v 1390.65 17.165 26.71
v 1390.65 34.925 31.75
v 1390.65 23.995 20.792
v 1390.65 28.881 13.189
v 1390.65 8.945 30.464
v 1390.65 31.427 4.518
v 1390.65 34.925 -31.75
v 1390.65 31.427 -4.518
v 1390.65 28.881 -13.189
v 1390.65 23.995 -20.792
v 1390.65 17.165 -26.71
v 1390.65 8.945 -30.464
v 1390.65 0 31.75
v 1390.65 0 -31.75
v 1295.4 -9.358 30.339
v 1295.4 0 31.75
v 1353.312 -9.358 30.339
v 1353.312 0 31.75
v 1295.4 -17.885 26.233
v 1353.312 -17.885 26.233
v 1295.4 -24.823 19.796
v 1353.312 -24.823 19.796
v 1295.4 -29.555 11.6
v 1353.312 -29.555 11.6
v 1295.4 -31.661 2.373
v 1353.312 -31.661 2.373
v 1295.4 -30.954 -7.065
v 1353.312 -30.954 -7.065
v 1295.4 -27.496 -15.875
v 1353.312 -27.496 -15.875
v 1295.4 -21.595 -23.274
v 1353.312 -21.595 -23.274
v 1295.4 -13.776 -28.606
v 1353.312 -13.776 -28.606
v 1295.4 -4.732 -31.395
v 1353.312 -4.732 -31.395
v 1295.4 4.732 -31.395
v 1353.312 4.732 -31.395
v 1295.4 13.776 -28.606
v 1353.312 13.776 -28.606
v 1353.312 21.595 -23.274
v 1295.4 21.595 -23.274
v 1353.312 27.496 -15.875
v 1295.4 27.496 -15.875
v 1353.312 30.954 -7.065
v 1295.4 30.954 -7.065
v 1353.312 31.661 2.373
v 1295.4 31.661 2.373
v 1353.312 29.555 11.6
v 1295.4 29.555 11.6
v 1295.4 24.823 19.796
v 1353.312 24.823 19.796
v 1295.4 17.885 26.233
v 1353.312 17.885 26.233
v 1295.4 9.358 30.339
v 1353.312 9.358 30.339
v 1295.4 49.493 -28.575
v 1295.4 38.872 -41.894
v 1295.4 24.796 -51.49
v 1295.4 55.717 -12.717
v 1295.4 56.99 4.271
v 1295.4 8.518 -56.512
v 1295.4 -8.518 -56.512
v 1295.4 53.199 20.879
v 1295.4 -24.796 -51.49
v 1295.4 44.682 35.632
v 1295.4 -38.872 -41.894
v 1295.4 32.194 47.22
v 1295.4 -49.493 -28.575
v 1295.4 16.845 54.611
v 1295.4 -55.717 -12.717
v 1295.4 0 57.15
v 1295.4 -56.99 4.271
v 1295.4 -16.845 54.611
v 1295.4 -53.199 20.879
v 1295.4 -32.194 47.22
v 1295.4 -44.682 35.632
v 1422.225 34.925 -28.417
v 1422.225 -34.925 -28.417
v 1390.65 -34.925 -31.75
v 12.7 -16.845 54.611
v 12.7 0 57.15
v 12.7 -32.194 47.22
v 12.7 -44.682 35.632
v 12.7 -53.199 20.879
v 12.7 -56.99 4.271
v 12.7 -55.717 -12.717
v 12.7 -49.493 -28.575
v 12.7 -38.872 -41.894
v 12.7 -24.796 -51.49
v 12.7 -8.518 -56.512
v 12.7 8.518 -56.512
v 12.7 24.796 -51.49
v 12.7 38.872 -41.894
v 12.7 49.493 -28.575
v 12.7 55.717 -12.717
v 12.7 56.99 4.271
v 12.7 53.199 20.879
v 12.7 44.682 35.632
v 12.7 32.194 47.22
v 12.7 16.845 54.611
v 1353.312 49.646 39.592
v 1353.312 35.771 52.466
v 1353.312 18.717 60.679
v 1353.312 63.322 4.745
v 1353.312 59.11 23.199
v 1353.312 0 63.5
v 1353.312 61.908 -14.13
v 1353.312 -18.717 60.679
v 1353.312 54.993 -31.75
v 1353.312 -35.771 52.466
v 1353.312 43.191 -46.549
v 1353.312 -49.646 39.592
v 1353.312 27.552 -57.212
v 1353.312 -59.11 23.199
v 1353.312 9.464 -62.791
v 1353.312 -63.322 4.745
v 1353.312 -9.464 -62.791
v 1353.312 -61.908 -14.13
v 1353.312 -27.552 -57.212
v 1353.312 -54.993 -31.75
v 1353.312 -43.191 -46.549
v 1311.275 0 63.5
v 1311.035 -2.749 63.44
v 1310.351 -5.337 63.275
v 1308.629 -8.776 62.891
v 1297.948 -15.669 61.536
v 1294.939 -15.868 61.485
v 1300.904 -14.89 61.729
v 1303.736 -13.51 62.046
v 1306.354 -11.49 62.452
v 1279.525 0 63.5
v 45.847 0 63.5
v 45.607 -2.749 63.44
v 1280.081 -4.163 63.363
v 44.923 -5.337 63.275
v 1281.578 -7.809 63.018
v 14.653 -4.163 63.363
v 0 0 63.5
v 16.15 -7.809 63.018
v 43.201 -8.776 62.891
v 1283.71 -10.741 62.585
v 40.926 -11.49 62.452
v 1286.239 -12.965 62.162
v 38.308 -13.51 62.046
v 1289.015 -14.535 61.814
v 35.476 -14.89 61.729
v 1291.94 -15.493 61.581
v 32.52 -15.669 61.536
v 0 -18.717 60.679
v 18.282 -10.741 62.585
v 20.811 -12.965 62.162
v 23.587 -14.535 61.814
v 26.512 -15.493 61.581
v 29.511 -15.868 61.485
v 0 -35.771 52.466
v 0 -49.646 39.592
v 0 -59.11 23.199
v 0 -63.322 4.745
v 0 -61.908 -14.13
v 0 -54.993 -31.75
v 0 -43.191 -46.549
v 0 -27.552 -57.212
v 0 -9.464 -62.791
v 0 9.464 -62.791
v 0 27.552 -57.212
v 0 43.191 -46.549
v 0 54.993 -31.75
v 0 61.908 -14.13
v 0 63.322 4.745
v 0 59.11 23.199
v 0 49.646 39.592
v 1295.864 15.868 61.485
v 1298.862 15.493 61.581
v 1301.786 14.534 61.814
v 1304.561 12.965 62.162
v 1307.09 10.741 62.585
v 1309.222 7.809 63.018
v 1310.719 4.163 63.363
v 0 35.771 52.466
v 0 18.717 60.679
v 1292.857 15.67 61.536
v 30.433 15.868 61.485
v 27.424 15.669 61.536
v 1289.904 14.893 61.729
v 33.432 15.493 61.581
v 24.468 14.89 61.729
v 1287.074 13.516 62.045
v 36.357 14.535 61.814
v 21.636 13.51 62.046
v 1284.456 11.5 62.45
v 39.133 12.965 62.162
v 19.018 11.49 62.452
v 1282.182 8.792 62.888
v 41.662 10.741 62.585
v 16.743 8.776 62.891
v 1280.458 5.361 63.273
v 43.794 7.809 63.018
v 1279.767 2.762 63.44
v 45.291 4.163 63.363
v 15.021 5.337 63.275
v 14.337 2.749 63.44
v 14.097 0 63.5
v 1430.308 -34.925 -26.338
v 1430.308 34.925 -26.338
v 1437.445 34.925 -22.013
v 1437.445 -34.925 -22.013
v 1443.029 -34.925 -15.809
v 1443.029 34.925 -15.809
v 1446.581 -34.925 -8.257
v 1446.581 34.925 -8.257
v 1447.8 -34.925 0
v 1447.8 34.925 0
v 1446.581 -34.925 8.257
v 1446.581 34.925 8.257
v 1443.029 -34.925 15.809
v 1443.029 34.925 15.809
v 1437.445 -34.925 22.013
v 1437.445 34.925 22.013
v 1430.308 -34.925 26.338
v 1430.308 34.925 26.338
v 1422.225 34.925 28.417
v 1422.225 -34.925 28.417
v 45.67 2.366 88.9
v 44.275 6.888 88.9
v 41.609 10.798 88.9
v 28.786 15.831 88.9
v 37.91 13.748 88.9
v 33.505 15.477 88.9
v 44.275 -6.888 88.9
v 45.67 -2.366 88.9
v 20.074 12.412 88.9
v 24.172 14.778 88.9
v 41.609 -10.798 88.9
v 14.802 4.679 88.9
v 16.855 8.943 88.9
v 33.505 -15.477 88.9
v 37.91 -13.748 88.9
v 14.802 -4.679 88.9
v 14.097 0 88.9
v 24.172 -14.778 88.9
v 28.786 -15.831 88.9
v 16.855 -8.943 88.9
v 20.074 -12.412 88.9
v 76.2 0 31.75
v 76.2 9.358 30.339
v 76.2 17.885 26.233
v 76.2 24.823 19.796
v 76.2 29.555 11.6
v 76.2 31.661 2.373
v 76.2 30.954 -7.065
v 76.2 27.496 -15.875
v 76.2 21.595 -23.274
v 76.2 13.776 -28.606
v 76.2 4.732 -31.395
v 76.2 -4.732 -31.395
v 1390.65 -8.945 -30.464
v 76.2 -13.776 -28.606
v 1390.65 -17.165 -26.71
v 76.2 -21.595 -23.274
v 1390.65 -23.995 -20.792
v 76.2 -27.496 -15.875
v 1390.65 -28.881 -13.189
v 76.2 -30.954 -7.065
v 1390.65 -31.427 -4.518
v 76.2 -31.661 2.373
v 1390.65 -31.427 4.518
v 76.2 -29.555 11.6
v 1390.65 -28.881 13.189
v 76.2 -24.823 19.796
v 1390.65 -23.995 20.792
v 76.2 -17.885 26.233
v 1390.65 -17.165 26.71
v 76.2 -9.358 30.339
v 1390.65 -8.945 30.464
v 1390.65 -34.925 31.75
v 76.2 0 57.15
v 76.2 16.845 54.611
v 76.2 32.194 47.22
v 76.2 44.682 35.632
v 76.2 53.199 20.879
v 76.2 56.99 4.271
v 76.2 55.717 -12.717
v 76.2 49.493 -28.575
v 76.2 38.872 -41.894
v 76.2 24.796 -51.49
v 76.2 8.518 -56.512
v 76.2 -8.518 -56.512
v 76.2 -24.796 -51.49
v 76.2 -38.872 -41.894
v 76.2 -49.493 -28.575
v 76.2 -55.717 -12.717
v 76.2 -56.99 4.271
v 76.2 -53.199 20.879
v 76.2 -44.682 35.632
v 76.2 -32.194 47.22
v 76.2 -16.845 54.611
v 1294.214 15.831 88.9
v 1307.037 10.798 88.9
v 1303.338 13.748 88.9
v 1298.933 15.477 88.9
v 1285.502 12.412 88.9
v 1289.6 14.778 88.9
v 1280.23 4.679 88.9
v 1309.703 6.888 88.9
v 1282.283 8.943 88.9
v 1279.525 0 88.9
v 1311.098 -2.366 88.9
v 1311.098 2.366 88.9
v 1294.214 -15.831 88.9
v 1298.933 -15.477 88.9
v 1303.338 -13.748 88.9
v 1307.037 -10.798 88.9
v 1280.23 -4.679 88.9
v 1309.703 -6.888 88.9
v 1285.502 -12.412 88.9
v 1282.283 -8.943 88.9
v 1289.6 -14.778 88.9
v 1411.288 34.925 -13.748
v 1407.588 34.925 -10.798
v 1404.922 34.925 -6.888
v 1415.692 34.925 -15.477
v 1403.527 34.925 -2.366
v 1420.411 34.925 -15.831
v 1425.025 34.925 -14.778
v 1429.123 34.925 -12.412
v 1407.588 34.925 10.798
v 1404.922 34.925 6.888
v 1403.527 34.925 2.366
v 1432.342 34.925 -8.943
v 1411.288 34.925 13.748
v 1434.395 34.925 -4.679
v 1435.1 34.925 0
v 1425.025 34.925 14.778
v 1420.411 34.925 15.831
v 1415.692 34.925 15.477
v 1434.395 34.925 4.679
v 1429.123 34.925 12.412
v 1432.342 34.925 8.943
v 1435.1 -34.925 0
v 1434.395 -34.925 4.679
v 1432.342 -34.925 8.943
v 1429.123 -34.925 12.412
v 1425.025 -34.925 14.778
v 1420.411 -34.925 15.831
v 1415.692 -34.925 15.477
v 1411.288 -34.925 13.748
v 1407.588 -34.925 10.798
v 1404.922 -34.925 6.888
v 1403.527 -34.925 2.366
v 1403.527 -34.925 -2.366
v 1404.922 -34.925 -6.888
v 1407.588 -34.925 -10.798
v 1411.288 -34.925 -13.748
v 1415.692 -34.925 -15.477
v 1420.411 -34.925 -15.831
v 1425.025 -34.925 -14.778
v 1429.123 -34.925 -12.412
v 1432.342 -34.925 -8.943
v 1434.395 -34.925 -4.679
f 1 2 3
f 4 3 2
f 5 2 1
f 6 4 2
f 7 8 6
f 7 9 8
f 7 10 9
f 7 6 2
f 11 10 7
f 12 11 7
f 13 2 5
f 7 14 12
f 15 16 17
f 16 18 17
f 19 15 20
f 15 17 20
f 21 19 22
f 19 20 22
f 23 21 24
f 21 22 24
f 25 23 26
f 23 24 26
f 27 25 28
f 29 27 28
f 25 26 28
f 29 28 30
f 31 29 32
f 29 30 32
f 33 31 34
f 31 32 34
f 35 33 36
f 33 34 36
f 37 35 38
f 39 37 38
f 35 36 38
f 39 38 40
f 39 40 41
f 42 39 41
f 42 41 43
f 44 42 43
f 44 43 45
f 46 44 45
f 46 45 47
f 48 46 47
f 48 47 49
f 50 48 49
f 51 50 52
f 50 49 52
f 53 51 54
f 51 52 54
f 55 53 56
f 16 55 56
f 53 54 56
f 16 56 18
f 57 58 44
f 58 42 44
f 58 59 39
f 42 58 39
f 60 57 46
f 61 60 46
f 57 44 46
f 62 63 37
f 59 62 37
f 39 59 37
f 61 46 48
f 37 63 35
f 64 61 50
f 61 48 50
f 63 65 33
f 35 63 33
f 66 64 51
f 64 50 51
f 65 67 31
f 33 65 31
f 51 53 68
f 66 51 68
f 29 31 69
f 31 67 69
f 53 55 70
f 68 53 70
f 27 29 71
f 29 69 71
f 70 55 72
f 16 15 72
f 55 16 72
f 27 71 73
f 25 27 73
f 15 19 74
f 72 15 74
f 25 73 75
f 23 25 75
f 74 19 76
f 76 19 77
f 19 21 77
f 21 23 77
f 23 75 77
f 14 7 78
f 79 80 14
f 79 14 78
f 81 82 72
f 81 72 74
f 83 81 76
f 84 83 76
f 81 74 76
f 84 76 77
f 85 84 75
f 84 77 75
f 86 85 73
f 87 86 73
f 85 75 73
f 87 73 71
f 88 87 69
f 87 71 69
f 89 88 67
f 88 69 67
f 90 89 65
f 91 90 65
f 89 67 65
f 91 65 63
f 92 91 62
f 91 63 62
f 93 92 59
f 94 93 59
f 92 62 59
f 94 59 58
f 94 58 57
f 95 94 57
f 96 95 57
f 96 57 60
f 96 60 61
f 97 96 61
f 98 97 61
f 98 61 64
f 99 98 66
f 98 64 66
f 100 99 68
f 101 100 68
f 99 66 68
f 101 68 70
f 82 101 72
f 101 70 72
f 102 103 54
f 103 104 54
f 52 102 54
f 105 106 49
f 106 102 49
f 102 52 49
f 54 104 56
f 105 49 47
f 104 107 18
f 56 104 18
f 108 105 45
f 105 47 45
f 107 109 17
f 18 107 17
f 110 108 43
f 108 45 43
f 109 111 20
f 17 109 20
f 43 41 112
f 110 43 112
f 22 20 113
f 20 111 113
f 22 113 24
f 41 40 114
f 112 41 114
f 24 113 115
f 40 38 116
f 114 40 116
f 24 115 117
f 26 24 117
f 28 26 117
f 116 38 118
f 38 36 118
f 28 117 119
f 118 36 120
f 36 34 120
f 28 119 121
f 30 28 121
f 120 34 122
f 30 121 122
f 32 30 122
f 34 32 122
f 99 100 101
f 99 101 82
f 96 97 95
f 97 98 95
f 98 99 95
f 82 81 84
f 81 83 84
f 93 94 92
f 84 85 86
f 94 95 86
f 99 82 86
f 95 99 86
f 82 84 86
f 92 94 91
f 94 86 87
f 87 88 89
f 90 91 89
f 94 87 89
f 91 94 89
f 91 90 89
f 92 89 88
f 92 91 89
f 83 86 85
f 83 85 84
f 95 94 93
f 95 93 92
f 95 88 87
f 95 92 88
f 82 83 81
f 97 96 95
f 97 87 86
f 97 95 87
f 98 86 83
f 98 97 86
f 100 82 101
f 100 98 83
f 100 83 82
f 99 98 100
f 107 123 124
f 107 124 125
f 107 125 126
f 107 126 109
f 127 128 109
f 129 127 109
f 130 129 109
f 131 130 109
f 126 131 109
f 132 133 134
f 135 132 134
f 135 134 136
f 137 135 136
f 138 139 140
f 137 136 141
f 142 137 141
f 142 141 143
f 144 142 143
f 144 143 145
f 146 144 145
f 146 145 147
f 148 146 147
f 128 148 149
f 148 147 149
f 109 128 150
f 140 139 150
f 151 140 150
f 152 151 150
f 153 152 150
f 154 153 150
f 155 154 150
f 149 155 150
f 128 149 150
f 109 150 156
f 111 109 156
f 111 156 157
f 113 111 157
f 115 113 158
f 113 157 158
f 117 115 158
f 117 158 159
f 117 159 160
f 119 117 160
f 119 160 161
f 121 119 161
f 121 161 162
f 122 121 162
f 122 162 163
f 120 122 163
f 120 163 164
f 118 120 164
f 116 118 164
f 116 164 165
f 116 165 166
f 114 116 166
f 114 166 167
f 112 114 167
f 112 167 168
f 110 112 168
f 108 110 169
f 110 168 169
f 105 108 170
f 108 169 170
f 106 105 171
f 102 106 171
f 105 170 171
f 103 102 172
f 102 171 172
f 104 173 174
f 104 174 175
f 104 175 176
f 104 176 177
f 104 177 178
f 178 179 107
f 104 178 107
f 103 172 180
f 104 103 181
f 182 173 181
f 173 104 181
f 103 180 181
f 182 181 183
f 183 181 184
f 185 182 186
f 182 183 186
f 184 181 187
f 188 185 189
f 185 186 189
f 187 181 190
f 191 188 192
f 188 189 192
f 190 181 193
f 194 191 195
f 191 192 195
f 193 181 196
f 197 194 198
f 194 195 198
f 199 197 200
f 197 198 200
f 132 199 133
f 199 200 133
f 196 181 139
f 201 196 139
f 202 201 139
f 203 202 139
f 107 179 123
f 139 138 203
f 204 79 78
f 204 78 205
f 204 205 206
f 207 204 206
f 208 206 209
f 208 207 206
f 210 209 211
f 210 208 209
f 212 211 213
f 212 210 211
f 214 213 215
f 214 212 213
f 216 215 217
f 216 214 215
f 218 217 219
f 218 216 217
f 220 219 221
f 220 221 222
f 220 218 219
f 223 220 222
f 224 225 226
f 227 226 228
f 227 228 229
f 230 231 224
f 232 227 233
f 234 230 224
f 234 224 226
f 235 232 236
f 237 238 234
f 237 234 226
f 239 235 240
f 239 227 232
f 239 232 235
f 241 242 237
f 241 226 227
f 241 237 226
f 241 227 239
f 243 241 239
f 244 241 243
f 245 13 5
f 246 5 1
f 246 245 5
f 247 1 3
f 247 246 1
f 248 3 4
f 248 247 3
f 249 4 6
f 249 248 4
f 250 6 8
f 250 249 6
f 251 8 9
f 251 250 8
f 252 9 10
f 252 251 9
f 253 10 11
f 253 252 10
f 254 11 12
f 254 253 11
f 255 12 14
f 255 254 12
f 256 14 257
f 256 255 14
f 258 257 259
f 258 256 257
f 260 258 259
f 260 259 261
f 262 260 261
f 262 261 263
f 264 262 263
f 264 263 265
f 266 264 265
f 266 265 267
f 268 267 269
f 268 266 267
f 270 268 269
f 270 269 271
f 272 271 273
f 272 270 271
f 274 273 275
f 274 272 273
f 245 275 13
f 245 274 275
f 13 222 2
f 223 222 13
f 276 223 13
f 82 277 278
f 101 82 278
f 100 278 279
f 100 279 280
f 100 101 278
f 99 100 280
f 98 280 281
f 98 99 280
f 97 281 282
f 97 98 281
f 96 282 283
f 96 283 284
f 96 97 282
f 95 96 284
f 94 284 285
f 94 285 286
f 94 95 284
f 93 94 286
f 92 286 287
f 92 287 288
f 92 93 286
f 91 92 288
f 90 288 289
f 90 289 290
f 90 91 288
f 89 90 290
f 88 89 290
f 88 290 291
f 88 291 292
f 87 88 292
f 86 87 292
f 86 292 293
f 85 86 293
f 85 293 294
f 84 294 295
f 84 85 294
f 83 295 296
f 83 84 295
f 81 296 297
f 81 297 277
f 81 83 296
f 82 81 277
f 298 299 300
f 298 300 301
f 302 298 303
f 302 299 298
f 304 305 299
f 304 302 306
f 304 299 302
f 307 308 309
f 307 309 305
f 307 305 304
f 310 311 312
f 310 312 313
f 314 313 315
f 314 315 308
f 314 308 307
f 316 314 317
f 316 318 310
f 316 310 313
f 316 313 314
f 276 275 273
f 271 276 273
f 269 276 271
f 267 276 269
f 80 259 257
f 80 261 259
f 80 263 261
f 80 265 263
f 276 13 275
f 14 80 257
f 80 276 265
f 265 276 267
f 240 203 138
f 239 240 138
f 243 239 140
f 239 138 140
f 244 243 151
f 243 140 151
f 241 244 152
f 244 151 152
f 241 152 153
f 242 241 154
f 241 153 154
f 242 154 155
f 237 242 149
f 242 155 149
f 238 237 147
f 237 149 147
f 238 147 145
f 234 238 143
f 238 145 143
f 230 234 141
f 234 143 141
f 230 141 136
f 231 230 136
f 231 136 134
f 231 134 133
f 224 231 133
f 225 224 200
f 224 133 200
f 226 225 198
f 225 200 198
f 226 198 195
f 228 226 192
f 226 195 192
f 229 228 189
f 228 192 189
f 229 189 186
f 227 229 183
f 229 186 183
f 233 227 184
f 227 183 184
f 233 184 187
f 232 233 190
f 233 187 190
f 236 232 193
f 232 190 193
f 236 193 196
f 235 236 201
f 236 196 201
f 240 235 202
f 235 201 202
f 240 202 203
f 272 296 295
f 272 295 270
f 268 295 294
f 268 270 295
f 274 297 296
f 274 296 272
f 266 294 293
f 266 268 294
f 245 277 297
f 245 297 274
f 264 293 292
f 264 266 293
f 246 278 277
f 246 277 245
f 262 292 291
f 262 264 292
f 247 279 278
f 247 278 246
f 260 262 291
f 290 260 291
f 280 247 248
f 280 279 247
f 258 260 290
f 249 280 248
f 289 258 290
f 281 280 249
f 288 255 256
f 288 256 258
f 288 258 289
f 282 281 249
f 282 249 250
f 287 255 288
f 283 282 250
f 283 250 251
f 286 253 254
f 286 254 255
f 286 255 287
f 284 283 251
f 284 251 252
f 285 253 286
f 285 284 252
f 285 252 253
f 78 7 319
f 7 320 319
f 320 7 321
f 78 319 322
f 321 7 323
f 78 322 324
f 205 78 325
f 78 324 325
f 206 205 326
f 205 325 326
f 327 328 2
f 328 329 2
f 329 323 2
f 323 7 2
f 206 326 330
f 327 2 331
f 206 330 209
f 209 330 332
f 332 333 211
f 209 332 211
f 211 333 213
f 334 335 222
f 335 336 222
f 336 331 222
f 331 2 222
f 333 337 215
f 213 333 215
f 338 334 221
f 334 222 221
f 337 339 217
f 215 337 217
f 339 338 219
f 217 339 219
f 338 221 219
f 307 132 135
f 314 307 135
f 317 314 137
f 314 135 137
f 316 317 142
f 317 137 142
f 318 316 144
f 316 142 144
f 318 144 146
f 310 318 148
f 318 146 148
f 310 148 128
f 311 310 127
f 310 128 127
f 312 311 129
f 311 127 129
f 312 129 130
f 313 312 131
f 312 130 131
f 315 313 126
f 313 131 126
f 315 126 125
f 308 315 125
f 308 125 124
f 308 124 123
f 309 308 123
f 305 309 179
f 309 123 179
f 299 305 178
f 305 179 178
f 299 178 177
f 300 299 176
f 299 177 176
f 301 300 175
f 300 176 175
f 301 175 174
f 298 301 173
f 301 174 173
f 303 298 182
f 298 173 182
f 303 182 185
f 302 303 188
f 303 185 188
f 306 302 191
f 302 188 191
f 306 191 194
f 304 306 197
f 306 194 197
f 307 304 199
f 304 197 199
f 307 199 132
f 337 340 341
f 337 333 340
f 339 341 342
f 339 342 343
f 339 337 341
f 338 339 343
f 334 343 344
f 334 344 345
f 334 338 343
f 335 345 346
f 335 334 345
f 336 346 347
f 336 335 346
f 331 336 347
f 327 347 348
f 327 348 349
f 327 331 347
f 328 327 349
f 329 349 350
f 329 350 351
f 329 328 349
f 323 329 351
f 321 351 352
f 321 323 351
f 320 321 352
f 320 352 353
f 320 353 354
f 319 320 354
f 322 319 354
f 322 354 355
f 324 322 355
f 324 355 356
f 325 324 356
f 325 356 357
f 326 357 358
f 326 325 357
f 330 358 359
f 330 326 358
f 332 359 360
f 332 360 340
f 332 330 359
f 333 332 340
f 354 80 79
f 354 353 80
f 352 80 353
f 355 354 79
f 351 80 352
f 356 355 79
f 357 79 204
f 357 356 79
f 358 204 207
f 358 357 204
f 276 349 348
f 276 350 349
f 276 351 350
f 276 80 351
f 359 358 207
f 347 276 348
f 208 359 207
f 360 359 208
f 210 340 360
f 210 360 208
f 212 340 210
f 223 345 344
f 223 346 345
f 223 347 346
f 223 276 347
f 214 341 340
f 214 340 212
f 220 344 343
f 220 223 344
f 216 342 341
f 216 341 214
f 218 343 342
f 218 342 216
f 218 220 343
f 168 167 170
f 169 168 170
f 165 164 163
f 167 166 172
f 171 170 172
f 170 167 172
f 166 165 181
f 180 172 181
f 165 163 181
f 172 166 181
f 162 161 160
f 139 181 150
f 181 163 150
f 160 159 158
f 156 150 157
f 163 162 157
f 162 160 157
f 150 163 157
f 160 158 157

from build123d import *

# Parameters (mm, degrees)
F0_W     = 15.875
F0_H     = 6.35
F0_H_2   = 25.4
F0_R     = 15.875
F5_DEPTH = 34.925


with BuildPart() as f1:
    # F0 (on Front) → F1 (revolve)
    with BuildSketch(Plane.XZ):
        Polygon((0, 63.5), (0, 0), (12.7, 0), (12.7, 57.15), (14.097, 57.15), (14.097, 63.5), align=None)
        with Locations((22.0345, 60.325)):
            Rectangle(F0_W, F0_H)
        Polygon((1279.525, 63.5), (29.972, 63.5), (29.972, 57.15), (76.2, 57.15), (1279.525, 57.15), align=None)
        with Locations((1287.4625, 60.325)):
            Rectangle(F0_W, F0_H)
        Polygon((1295.4, 31.75), (1353.312, 31.75), (1353.312, 63.5), (1295.4, 63.5), (1295.4, 57.15), align=None)
    revolve(axis=Axis((6.35, 0, 0), (1, 0, 0)))

    # F0 (on Front) → F2 (revolve)
    with BuildSketch(Plane.XZ):
        with Locations((22.0345, 76.2)):
            Rectangle(F0_W, F0_H_2)
        with Locations((22.0345, 60.325)):
            Rectangle(F0_W, F0_H)
    revolve(axis=Axis((29.972, 0, 73.025), (0, 0, 1)))

    # F0 (on Front) → F3 (revolve)
    with BuildSketch(Plane.XZ):
        with Locations((1287.4625, 76.2)):
            Rectangle(F0_W, F0_H_2)
        with Locations((1287.4625, 60.325)):
            Rectangle(F0_W, F0_H)
    revolve(axis=Axis((1295.4, 0, 73.025), (0, 0, 1)))


with BuildPart() as f4:
    # F0 (on Front) → F4 (revolve)
    with BuildSketch(Plane.XZ):
        Polygon((12.7, 57.15), (12.7, 0), (1390.65, 0), (1390.65, 31.75), (1353.312, 31.75), (1295.4, 31.75), (76.2, 31.75), (76.2, 57.15), (29.972, 57.15), (14.097, 57.15), align=None)
    revolve(axis=Axis((701.675, 0, 0), (-1, 0, 0)))

    # F0 (on Front) → F5 (join, symmetric)
    with BuildSketch(Plane.XZ):
        with BuildLine():
            Line((1390.65, 31.75), (1390.65, 0))
            ThreePointArc((1390.65, 0), (1400.1093327939, 21.239630229), (1422.2245856354, 28.4171270718))
            Line((1422.2245856354, 28.4171270718), (1390.65, 31.75))
        make_face()
        with BuildLine():
            ThreePointArc((1422.2245856354, 28.4171270718), (1400.1093327939, 21.239630229), (1390.65, 0))
            ThreePointArc((1390.65, 0), (1400.1093327939, -21.239630229), (1422.2245856354, -28.4171270718))
            ThreePointArc((1422.2245856354, -28.4171270718), (1440.464630229, -19.1156672061), (1447.8, 0))
            ThreePointArc((1447.8, 0), (1440.464630229, 19.1156672061), (1422.2245856354, 28.4171270718))
        make_face()
        with Locations((1419.225, 0)):
            Circle(F0_R, mode=Mode.SUBTRACT)
        with BuildLine():
            ThreePointArc((1422.2245856354, -28.4171270718), (1400.1093327939, -21.239630229), (1390.65, 0))
            Line((1390.65, 0), (1390.65, -31.75))
            Line((1390.65, -31.75), (1422.2245856354, -28.4171270718))
        make_face()
    extrude(amount=F5_DEPTH, both=True)


solid = Compound([f1.part, f4.part])
